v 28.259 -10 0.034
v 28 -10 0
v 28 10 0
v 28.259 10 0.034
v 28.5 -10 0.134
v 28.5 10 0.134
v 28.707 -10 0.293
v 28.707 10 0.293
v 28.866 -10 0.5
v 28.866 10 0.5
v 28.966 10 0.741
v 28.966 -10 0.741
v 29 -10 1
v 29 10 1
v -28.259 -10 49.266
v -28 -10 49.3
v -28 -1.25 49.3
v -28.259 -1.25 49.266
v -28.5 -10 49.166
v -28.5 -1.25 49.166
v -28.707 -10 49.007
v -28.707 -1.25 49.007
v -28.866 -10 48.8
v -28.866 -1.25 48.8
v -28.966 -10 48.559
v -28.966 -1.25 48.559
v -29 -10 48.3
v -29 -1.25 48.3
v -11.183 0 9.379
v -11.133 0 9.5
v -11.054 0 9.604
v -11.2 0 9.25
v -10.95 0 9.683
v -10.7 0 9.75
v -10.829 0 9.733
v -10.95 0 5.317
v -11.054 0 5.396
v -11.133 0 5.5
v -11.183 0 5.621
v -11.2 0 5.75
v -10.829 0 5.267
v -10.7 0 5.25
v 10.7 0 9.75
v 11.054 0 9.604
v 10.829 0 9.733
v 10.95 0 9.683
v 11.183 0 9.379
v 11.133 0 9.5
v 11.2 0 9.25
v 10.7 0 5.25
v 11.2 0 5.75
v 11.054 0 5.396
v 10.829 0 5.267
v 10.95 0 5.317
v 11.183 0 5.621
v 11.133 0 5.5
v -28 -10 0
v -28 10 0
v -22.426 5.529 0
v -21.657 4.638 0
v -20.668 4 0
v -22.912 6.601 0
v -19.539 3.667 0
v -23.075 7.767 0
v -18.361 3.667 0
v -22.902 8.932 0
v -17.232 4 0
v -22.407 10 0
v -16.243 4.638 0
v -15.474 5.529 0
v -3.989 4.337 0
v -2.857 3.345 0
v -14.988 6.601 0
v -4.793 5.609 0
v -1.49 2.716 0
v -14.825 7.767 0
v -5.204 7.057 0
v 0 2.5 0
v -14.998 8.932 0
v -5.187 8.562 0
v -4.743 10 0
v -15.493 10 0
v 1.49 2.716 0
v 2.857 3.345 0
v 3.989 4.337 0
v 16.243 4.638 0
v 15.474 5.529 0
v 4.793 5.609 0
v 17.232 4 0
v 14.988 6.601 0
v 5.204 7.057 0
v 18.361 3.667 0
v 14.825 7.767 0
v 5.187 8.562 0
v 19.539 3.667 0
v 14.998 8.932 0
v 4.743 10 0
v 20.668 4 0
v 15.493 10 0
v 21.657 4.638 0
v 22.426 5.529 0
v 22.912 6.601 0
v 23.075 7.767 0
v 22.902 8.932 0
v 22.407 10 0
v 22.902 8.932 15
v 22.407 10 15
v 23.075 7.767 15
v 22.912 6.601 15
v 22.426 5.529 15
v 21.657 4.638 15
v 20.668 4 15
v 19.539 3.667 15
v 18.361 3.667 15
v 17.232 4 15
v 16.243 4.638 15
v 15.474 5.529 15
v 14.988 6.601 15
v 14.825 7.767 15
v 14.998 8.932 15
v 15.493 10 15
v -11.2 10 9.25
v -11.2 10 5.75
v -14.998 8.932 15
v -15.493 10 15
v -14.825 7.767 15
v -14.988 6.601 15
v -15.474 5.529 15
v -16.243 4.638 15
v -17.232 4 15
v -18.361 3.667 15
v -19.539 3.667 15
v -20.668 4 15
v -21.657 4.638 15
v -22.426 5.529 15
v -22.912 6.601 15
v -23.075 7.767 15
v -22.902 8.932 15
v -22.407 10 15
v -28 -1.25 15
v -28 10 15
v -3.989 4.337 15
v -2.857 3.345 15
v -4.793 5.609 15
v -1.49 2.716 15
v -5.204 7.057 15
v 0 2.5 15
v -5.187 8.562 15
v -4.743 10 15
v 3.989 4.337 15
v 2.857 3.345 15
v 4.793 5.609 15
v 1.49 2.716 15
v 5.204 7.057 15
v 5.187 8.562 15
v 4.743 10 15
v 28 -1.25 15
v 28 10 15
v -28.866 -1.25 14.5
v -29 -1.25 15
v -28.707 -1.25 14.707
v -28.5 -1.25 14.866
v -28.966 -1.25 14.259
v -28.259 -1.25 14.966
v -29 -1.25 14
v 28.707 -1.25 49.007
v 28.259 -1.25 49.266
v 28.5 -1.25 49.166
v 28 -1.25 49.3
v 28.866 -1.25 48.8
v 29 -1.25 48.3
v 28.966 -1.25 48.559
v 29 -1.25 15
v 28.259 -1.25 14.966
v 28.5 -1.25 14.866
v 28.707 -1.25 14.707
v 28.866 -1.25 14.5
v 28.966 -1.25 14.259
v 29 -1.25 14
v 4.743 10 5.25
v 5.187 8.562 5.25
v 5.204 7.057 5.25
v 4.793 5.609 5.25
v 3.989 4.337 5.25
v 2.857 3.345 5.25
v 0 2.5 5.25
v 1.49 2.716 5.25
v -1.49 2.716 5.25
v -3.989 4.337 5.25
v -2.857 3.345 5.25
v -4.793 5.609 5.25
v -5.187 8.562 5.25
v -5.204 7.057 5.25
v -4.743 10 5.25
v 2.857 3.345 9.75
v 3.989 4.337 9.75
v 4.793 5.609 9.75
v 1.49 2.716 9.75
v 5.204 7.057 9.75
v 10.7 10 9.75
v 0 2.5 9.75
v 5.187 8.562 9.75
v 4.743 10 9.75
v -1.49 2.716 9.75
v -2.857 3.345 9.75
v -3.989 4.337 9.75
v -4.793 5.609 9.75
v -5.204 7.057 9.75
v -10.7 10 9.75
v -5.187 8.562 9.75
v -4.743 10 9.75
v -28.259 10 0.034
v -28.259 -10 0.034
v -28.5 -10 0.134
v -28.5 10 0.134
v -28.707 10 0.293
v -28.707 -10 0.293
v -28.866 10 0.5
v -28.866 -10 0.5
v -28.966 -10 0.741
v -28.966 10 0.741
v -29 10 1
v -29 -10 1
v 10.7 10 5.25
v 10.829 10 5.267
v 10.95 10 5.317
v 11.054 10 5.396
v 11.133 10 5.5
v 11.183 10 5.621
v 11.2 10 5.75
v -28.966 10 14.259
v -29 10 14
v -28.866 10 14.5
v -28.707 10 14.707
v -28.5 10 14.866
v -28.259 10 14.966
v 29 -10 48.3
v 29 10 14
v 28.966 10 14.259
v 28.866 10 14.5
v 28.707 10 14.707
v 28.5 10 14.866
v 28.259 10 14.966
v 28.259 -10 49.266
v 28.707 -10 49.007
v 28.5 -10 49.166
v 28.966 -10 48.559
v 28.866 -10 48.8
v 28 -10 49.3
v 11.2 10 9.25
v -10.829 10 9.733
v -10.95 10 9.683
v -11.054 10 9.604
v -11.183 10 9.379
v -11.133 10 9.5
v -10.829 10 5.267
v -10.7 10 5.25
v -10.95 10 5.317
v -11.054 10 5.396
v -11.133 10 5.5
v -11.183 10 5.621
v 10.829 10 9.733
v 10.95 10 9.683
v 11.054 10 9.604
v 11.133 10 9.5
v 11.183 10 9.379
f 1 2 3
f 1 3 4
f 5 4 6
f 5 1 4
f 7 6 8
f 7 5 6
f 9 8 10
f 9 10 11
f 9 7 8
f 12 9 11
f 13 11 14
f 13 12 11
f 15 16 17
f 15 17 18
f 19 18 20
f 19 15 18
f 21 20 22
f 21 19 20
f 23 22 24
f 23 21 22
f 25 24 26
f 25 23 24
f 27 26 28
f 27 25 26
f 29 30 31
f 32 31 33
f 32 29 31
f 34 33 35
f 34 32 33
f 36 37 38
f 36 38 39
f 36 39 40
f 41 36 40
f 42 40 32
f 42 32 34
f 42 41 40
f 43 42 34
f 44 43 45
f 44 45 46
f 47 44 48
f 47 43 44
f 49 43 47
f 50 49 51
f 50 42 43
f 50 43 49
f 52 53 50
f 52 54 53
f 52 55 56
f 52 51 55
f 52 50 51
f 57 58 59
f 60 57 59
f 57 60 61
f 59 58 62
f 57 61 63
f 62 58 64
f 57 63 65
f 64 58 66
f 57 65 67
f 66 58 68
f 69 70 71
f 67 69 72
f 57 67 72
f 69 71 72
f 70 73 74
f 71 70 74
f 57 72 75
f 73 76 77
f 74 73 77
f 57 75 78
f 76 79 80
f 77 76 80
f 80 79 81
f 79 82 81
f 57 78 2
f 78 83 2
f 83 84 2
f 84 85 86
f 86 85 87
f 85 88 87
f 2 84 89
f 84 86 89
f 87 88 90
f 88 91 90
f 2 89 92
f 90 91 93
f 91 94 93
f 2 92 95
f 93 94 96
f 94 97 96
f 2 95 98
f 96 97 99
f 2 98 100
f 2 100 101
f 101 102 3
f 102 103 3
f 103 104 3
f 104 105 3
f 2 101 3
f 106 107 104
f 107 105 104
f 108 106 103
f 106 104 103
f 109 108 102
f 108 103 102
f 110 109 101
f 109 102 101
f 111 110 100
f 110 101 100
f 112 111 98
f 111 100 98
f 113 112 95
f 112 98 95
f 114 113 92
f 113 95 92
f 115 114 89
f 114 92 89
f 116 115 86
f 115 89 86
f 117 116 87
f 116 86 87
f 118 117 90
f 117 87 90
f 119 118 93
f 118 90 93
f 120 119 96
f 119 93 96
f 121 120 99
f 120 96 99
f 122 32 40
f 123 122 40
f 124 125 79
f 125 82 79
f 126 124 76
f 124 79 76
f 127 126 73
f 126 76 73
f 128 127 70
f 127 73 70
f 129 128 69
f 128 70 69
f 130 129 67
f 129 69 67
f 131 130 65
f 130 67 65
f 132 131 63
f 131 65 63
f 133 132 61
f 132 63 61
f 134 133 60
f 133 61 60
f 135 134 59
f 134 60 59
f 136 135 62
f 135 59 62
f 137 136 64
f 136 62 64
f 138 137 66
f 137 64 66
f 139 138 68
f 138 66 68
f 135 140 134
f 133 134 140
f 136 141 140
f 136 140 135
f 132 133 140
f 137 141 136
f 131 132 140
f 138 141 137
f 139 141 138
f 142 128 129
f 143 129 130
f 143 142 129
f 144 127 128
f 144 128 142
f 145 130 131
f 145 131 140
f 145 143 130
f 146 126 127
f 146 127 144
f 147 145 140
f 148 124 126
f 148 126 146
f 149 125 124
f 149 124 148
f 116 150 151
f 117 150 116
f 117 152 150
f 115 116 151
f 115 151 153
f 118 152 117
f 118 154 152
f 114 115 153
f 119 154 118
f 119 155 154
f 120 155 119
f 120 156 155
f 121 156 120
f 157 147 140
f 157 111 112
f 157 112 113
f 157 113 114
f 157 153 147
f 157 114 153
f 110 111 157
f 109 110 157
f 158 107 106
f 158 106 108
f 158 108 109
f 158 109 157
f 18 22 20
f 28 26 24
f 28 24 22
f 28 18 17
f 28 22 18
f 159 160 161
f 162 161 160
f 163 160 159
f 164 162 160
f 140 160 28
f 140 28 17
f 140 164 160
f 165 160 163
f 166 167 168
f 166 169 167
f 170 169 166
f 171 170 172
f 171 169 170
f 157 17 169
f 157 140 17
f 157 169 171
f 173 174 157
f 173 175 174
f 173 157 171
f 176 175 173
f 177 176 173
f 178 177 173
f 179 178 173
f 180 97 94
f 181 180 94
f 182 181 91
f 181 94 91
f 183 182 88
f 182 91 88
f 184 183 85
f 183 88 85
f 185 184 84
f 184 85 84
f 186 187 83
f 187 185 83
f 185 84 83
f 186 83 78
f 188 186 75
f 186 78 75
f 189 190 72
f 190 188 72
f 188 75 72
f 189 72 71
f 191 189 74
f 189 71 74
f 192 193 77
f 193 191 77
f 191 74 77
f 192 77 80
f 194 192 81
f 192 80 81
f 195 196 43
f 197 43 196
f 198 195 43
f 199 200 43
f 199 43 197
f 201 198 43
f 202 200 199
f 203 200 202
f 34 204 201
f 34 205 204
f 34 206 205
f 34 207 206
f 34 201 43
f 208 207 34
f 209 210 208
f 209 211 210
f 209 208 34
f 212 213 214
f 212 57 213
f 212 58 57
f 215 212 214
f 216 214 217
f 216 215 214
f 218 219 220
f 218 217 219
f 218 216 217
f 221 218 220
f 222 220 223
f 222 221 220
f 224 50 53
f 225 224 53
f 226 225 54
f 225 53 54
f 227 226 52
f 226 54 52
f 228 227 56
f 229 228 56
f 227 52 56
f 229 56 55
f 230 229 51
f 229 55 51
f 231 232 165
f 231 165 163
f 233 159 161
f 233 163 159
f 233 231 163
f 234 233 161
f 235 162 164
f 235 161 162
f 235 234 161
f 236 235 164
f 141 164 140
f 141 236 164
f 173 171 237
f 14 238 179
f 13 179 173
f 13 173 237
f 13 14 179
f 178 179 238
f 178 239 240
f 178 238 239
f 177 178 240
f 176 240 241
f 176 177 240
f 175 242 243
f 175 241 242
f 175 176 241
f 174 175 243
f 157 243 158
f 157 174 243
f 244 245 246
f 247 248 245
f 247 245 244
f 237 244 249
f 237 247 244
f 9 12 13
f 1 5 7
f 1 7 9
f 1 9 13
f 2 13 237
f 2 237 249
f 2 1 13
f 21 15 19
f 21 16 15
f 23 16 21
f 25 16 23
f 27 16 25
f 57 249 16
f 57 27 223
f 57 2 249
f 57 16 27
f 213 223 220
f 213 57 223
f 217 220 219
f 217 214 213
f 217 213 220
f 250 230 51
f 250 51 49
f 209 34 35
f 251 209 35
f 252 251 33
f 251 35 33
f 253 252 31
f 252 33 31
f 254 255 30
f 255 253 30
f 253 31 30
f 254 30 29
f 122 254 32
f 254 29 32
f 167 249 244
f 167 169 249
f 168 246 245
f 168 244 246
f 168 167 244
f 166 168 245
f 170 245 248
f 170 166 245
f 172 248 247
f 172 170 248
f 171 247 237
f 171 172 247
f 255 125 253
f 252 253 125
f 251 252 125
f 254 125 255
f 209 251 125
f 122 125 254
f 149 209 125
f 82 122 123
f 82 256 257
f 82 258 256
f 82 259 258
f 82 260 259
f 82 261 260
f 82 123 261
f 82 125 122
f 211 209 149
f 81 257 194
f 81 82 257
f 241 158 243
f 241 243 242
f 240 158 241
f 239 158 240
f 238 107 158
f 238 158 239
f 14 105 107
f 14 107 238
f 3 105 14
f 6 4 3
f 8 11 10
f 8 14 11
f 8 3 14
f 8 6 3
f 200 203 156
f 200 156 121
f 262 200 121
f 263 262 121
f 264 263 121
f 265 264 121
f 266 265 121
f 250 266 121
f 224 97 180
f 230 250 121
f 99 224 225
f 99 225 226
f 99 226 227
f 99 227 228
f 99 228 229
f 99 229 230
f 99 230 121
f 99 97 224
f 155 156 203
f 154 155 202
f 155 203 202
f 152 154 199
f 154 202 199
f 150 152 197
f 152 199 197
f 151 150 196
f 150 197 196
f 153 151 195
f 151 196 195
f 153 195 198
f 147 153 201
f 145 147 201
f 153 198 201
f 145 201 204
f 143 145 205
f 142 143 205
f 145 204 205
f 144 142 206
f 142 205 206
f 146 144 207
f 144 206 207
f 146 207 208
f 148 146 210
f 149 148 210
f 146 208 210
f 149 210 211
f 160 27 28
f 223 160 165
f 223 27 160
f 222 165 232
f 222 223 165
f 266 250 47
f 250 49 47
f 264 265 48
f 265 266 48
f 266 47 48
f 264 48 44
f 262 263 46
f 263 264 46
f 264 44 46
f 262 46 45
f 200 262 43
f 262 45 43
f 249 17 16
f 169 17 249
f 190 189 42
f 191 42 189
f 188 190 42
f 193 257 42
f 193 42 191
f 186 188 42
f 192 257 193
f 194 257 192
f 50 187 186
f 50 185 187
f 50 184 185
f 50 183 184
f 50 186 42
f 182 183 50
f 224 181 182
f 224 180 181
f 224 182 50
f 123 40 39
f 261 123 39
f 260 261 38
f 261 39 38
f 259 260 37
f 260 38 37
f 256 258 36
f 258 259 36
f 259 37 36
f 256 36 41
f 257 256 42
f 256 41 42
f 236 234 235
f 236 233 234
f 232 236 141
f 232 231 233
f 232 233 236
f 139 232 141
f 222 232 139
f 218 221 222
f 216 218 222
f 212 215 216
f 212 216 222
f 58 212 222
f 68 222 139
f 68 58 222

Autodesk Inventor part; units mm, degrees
ref_plane "YZ Plane" through (0, 0, 0) normal (1, 0, 0) x (0, 1, 0)
ref_plane "XZ Plane" through (0, 0, 0) normal (0, 1, 0) x (-1, 0, 0)
ref_plane "XY Plane" through (0, 0, 0) normal (0, 0, 1) x (1, 0, 0)
sketch "Sketch1" plane through (0, 0, 0) normal (0, 0, 1) x (1, 0, 0)
  line L0 (-29, 10) -> (29, 10)
  line L1 (29, 10) -> (29, -10)
  line L2 (29, -10) -> (-29, -10)
  line L3 (-29, -10) -> (-29, 10)
  line L4 (-29, 10) -> (29, -10) construction
  line L5 (29, 10) -> (-29, -10) construction
  point P0 (0, 0)
  dimension "d0" = 58
  dimension "d1" = 20
extrude "Extrusion1" add sketch "Sketch1" along normal blind 15
sketch "Sketch3" plane through (0, 0, 0) normal (0, 0, 1) x (1, 0, 0)
  line L0 (-29, -10) -> (29, -10) projected
  line L1 (29, -10) -> (29, 10) projected
  line L2 (29, 10) -> (-29, 10) projected
  line L3 (-29, 10) -> (-29, -10) projected
  line L4 (-40.6, 0) -> (40.6, 0) projected
  line L5 (0, -12.225) -> (0, 13.85) projected
  circle A0 centre (18.95, 7.75) radius 4.125
  circle A1 centre (-18.95, 7.75) radius 4.125
  point P0 (0, 0)
  point P1 (-22.4073, 10)
  point P2 (-15.4927, 10)
  point P3 (15.4927, 10)
  point P4 (22.4073, 10)
  dimension "d4" = 8.25
  dimension "d5" = 8.25
  dimension "d6" = 37.9
  dimension "d7" = 2.25
extrude "Extrusion2" cut sketch "Sketch3" along normal through all contours L2 A1 | L2 A0 picked at (-19.324, 7.5879) picked at (18.8469, 7.6595)
sketch "Sketch4" plane through (-15.4927, 10, 0) normal (0, 1, 0) x (1, 0, 0)
  line L0 (0, 0) -> (0, -15) projected
  line L1 (30.9853, -15) -> (0, -15) projected
  line L2 (30.9853, -15) -> (30.9853, 0) projected
  line L3 (30.9853, 0) -> (0, 0) projected
  line L4 (-25.1073, 0) -> (56.0927, 0) projected
  line L5 (15.4927, 0) -> (15.4927, -15) construction
  line L6 (30.9853, -15) -> (0, -15) construction
  line L7 (30.9853, -15) -> (30.9853, 0) construction
  line L8 (30.9853, -7.5) -> (0, -7.5) construction
  line L9 (4.2927, -5.25) -> (26.6927, -5.25)
  line L10 (26.6927, -5.25) -> (26.6927, -9.75)
  line L11 (26.6927, -9.75) -> (4.2927, -9.75)
  line L12 (4.2927, -9.75) -> (4.2927, -5.25)
  line L13 (4.2927, -5.25) -> (26.6927, -9.75)
  line L14 (26.6927, -5.25) -> (4.2927, -9.75)
  point P0 (15.4927, -7.5)
  dimension "d12" = 22.4
  dimension "d13" = 4.5
sketch "Sketch5" plane through (0, 0, 0) normal (0, 1, 0) x (-1, 0, 0)
  line L0 (15.4927, 0) -> (15.4927, 15) projected
  line L1 (-15.4927, 15) -> (15.4927, 15) projected
  line L2 (-15.4927, 15) -> (-15.4927, 0) projected
  line L3 (-15.4927, 0) -> (15.4927, 0) projected
  line L4 (40.6, 0) -> (-40.6, 0) projected
  line L5 (0, -3.05) -> (0, 18.3) projected
  line L6 (11.25, 9.75) -> (-11.25, 9.75)
  line L7 (-11.25, 9.75) -> (-11.25, 15.25)
  line L8 (-11.25, 15.25) -> (11.25, 15.25)
  line L9 (11.25, 15.25) -> (11.25, 9.75)
  line L10 (11.25, 9.75) -> (-11.25, 15.25) construction
  line L11 (-11.25, 9.75) -> (11.25, 15.25) construction
  point P0 (0, 0)
  point P1 (0, 12.5)
  dimension "d10" = 22.5
  dimension "d11" = 5.5
extrude "Extrusion3" cut sketch "Sketch4" against normal blind 10 contours L13 L14 L12 | L9 L14 L13 | L10 L13 L14 | L14 L13 L11
sketch "Sketch6" plane through (0, 0, 0) normal (0, 0, -1) x (-1, 0, 0)
  line L0 (11.2, 0) -> (-11.2, 0) projected
  arc A0 (15.4927, 10) -> (22.4073, 10) centre (18.95, 7.75) ccw projected
  line L1 (-15.4927, 10) -> (15.4927, 10) projected
  arc A1 (-22.4073, 10) -> (-15.4927, 10) centre (-18.95, 7.75) ccw projected
  line L2 (-29, 10) -> (-22.4073, 10) projected
  line L3 (-29, -10) -> (-29, 10) projected
  line L4 (29, -10) -> (-29, -10) projected
  line L5 (29, 10) -> (29, -10) projected
  line L6 (22.4073, 10) -> (29, 10) projected
  line L7 (40.6, 0) -> (-40.6, 0) projected
  line L8 (0, -14.25) -> (0, 15.5) projected
  circle A2 centre (0, 7.75) radius 5.25
  point P0 (0, 0)
  dimension "d16" = 10.5
extrude "Extrusion4" cut sketch "Sketch6" against normal through all contours A2 L1 L8 | L8 L1 A2 | L8 A2 L1 | L1 A2 L8
sketch "Sketch8" plane through (0, 0, 15) normal (0, 0, 1) x (1, 0, 0)
  arc A0 (-4.7434, 10) -> (4.7434, 10) centre (0, 7.75) ccw projected
  line L0 (-4.7434, 10) -> (-15.4927, 10) projected
  arc A1 (-22.4073, 10) -> (-15.4927, 10) centre (-18.95, 7.75) ccw projected
  line L1 (-22.4073, 10) -> (-29, 10) projected
  line L2 (-29, 10) -> (-29, -10) projected
  line L3 (-29, -10) -> (29, -10) projected
  line L4 (29, -10) -> (29, 10) projected
  line L5 (29, 10) -> (22.4073, 10) projected
  arc A2 (15.4927, 10) -> (22.4073, 10) centre (18.95, 7.75) ccw projected
  line L6 (15.4927, 10) -> (4.7434, 10) projected
  line L7 (-40.6, 0) -> (40.6, 0) projected
  line L8 (0, -14) -> (0, 14) projected
  line L9 (-29, 10) -> (-29, -10) projected
  line L10 (29, -10) -> (-29, -10)
  line L11 (-29, -10) -> (-29, -1.25)
  line L12 (-29, -1.25) -> (29, -1.25)
  line L13 (29, -1.25) -> (29, -10)
  point P0 (0, 0)
  point P1 (29, -1.25)
  dimension "d19" = 9
extrude "Extrusion5" add sketch "Sketch8" along normal blind 34.3 contours L12 L4 L3 L8 | L8 L3 L2 L12
fillet "Fillet4" radius 1 4 edges at (-29, -5.625, 49.3) (29, -5.625, 49.3) (-29, 4.375, 15) (29, 4.375, 15)
fillet "Fillet5" radius 1 2 edges at (-29, 0, 0) (29, 0, 0)
fillet "Fillet6" radius 0.5 4 edges at (-11.2, 5, 5.25) (-11.2, 5, 9.75) (11.2, 5, 5.25) (11.2, 5, 9.75)
equation "\"BendRadius\" = Thickness"
equation "\"BendReliefWidth\" = Thickness"
equation "\"BendReliefDepth\" = 0.5 * Thickness"
equation "\"CornerReliefSize\" = 4 * Thickness"
equation "\"MinimumRemnant\" = 2 * Thickness"
equation "\"TransitionRadius\" = BendRadius"
equation "\"JacobiRadiusSize\" = BendRadius"
equation "\"GapSize\" = Thickness"
equation "\"Thickness\" = 3.048"
properties part number "_3DPrint"
